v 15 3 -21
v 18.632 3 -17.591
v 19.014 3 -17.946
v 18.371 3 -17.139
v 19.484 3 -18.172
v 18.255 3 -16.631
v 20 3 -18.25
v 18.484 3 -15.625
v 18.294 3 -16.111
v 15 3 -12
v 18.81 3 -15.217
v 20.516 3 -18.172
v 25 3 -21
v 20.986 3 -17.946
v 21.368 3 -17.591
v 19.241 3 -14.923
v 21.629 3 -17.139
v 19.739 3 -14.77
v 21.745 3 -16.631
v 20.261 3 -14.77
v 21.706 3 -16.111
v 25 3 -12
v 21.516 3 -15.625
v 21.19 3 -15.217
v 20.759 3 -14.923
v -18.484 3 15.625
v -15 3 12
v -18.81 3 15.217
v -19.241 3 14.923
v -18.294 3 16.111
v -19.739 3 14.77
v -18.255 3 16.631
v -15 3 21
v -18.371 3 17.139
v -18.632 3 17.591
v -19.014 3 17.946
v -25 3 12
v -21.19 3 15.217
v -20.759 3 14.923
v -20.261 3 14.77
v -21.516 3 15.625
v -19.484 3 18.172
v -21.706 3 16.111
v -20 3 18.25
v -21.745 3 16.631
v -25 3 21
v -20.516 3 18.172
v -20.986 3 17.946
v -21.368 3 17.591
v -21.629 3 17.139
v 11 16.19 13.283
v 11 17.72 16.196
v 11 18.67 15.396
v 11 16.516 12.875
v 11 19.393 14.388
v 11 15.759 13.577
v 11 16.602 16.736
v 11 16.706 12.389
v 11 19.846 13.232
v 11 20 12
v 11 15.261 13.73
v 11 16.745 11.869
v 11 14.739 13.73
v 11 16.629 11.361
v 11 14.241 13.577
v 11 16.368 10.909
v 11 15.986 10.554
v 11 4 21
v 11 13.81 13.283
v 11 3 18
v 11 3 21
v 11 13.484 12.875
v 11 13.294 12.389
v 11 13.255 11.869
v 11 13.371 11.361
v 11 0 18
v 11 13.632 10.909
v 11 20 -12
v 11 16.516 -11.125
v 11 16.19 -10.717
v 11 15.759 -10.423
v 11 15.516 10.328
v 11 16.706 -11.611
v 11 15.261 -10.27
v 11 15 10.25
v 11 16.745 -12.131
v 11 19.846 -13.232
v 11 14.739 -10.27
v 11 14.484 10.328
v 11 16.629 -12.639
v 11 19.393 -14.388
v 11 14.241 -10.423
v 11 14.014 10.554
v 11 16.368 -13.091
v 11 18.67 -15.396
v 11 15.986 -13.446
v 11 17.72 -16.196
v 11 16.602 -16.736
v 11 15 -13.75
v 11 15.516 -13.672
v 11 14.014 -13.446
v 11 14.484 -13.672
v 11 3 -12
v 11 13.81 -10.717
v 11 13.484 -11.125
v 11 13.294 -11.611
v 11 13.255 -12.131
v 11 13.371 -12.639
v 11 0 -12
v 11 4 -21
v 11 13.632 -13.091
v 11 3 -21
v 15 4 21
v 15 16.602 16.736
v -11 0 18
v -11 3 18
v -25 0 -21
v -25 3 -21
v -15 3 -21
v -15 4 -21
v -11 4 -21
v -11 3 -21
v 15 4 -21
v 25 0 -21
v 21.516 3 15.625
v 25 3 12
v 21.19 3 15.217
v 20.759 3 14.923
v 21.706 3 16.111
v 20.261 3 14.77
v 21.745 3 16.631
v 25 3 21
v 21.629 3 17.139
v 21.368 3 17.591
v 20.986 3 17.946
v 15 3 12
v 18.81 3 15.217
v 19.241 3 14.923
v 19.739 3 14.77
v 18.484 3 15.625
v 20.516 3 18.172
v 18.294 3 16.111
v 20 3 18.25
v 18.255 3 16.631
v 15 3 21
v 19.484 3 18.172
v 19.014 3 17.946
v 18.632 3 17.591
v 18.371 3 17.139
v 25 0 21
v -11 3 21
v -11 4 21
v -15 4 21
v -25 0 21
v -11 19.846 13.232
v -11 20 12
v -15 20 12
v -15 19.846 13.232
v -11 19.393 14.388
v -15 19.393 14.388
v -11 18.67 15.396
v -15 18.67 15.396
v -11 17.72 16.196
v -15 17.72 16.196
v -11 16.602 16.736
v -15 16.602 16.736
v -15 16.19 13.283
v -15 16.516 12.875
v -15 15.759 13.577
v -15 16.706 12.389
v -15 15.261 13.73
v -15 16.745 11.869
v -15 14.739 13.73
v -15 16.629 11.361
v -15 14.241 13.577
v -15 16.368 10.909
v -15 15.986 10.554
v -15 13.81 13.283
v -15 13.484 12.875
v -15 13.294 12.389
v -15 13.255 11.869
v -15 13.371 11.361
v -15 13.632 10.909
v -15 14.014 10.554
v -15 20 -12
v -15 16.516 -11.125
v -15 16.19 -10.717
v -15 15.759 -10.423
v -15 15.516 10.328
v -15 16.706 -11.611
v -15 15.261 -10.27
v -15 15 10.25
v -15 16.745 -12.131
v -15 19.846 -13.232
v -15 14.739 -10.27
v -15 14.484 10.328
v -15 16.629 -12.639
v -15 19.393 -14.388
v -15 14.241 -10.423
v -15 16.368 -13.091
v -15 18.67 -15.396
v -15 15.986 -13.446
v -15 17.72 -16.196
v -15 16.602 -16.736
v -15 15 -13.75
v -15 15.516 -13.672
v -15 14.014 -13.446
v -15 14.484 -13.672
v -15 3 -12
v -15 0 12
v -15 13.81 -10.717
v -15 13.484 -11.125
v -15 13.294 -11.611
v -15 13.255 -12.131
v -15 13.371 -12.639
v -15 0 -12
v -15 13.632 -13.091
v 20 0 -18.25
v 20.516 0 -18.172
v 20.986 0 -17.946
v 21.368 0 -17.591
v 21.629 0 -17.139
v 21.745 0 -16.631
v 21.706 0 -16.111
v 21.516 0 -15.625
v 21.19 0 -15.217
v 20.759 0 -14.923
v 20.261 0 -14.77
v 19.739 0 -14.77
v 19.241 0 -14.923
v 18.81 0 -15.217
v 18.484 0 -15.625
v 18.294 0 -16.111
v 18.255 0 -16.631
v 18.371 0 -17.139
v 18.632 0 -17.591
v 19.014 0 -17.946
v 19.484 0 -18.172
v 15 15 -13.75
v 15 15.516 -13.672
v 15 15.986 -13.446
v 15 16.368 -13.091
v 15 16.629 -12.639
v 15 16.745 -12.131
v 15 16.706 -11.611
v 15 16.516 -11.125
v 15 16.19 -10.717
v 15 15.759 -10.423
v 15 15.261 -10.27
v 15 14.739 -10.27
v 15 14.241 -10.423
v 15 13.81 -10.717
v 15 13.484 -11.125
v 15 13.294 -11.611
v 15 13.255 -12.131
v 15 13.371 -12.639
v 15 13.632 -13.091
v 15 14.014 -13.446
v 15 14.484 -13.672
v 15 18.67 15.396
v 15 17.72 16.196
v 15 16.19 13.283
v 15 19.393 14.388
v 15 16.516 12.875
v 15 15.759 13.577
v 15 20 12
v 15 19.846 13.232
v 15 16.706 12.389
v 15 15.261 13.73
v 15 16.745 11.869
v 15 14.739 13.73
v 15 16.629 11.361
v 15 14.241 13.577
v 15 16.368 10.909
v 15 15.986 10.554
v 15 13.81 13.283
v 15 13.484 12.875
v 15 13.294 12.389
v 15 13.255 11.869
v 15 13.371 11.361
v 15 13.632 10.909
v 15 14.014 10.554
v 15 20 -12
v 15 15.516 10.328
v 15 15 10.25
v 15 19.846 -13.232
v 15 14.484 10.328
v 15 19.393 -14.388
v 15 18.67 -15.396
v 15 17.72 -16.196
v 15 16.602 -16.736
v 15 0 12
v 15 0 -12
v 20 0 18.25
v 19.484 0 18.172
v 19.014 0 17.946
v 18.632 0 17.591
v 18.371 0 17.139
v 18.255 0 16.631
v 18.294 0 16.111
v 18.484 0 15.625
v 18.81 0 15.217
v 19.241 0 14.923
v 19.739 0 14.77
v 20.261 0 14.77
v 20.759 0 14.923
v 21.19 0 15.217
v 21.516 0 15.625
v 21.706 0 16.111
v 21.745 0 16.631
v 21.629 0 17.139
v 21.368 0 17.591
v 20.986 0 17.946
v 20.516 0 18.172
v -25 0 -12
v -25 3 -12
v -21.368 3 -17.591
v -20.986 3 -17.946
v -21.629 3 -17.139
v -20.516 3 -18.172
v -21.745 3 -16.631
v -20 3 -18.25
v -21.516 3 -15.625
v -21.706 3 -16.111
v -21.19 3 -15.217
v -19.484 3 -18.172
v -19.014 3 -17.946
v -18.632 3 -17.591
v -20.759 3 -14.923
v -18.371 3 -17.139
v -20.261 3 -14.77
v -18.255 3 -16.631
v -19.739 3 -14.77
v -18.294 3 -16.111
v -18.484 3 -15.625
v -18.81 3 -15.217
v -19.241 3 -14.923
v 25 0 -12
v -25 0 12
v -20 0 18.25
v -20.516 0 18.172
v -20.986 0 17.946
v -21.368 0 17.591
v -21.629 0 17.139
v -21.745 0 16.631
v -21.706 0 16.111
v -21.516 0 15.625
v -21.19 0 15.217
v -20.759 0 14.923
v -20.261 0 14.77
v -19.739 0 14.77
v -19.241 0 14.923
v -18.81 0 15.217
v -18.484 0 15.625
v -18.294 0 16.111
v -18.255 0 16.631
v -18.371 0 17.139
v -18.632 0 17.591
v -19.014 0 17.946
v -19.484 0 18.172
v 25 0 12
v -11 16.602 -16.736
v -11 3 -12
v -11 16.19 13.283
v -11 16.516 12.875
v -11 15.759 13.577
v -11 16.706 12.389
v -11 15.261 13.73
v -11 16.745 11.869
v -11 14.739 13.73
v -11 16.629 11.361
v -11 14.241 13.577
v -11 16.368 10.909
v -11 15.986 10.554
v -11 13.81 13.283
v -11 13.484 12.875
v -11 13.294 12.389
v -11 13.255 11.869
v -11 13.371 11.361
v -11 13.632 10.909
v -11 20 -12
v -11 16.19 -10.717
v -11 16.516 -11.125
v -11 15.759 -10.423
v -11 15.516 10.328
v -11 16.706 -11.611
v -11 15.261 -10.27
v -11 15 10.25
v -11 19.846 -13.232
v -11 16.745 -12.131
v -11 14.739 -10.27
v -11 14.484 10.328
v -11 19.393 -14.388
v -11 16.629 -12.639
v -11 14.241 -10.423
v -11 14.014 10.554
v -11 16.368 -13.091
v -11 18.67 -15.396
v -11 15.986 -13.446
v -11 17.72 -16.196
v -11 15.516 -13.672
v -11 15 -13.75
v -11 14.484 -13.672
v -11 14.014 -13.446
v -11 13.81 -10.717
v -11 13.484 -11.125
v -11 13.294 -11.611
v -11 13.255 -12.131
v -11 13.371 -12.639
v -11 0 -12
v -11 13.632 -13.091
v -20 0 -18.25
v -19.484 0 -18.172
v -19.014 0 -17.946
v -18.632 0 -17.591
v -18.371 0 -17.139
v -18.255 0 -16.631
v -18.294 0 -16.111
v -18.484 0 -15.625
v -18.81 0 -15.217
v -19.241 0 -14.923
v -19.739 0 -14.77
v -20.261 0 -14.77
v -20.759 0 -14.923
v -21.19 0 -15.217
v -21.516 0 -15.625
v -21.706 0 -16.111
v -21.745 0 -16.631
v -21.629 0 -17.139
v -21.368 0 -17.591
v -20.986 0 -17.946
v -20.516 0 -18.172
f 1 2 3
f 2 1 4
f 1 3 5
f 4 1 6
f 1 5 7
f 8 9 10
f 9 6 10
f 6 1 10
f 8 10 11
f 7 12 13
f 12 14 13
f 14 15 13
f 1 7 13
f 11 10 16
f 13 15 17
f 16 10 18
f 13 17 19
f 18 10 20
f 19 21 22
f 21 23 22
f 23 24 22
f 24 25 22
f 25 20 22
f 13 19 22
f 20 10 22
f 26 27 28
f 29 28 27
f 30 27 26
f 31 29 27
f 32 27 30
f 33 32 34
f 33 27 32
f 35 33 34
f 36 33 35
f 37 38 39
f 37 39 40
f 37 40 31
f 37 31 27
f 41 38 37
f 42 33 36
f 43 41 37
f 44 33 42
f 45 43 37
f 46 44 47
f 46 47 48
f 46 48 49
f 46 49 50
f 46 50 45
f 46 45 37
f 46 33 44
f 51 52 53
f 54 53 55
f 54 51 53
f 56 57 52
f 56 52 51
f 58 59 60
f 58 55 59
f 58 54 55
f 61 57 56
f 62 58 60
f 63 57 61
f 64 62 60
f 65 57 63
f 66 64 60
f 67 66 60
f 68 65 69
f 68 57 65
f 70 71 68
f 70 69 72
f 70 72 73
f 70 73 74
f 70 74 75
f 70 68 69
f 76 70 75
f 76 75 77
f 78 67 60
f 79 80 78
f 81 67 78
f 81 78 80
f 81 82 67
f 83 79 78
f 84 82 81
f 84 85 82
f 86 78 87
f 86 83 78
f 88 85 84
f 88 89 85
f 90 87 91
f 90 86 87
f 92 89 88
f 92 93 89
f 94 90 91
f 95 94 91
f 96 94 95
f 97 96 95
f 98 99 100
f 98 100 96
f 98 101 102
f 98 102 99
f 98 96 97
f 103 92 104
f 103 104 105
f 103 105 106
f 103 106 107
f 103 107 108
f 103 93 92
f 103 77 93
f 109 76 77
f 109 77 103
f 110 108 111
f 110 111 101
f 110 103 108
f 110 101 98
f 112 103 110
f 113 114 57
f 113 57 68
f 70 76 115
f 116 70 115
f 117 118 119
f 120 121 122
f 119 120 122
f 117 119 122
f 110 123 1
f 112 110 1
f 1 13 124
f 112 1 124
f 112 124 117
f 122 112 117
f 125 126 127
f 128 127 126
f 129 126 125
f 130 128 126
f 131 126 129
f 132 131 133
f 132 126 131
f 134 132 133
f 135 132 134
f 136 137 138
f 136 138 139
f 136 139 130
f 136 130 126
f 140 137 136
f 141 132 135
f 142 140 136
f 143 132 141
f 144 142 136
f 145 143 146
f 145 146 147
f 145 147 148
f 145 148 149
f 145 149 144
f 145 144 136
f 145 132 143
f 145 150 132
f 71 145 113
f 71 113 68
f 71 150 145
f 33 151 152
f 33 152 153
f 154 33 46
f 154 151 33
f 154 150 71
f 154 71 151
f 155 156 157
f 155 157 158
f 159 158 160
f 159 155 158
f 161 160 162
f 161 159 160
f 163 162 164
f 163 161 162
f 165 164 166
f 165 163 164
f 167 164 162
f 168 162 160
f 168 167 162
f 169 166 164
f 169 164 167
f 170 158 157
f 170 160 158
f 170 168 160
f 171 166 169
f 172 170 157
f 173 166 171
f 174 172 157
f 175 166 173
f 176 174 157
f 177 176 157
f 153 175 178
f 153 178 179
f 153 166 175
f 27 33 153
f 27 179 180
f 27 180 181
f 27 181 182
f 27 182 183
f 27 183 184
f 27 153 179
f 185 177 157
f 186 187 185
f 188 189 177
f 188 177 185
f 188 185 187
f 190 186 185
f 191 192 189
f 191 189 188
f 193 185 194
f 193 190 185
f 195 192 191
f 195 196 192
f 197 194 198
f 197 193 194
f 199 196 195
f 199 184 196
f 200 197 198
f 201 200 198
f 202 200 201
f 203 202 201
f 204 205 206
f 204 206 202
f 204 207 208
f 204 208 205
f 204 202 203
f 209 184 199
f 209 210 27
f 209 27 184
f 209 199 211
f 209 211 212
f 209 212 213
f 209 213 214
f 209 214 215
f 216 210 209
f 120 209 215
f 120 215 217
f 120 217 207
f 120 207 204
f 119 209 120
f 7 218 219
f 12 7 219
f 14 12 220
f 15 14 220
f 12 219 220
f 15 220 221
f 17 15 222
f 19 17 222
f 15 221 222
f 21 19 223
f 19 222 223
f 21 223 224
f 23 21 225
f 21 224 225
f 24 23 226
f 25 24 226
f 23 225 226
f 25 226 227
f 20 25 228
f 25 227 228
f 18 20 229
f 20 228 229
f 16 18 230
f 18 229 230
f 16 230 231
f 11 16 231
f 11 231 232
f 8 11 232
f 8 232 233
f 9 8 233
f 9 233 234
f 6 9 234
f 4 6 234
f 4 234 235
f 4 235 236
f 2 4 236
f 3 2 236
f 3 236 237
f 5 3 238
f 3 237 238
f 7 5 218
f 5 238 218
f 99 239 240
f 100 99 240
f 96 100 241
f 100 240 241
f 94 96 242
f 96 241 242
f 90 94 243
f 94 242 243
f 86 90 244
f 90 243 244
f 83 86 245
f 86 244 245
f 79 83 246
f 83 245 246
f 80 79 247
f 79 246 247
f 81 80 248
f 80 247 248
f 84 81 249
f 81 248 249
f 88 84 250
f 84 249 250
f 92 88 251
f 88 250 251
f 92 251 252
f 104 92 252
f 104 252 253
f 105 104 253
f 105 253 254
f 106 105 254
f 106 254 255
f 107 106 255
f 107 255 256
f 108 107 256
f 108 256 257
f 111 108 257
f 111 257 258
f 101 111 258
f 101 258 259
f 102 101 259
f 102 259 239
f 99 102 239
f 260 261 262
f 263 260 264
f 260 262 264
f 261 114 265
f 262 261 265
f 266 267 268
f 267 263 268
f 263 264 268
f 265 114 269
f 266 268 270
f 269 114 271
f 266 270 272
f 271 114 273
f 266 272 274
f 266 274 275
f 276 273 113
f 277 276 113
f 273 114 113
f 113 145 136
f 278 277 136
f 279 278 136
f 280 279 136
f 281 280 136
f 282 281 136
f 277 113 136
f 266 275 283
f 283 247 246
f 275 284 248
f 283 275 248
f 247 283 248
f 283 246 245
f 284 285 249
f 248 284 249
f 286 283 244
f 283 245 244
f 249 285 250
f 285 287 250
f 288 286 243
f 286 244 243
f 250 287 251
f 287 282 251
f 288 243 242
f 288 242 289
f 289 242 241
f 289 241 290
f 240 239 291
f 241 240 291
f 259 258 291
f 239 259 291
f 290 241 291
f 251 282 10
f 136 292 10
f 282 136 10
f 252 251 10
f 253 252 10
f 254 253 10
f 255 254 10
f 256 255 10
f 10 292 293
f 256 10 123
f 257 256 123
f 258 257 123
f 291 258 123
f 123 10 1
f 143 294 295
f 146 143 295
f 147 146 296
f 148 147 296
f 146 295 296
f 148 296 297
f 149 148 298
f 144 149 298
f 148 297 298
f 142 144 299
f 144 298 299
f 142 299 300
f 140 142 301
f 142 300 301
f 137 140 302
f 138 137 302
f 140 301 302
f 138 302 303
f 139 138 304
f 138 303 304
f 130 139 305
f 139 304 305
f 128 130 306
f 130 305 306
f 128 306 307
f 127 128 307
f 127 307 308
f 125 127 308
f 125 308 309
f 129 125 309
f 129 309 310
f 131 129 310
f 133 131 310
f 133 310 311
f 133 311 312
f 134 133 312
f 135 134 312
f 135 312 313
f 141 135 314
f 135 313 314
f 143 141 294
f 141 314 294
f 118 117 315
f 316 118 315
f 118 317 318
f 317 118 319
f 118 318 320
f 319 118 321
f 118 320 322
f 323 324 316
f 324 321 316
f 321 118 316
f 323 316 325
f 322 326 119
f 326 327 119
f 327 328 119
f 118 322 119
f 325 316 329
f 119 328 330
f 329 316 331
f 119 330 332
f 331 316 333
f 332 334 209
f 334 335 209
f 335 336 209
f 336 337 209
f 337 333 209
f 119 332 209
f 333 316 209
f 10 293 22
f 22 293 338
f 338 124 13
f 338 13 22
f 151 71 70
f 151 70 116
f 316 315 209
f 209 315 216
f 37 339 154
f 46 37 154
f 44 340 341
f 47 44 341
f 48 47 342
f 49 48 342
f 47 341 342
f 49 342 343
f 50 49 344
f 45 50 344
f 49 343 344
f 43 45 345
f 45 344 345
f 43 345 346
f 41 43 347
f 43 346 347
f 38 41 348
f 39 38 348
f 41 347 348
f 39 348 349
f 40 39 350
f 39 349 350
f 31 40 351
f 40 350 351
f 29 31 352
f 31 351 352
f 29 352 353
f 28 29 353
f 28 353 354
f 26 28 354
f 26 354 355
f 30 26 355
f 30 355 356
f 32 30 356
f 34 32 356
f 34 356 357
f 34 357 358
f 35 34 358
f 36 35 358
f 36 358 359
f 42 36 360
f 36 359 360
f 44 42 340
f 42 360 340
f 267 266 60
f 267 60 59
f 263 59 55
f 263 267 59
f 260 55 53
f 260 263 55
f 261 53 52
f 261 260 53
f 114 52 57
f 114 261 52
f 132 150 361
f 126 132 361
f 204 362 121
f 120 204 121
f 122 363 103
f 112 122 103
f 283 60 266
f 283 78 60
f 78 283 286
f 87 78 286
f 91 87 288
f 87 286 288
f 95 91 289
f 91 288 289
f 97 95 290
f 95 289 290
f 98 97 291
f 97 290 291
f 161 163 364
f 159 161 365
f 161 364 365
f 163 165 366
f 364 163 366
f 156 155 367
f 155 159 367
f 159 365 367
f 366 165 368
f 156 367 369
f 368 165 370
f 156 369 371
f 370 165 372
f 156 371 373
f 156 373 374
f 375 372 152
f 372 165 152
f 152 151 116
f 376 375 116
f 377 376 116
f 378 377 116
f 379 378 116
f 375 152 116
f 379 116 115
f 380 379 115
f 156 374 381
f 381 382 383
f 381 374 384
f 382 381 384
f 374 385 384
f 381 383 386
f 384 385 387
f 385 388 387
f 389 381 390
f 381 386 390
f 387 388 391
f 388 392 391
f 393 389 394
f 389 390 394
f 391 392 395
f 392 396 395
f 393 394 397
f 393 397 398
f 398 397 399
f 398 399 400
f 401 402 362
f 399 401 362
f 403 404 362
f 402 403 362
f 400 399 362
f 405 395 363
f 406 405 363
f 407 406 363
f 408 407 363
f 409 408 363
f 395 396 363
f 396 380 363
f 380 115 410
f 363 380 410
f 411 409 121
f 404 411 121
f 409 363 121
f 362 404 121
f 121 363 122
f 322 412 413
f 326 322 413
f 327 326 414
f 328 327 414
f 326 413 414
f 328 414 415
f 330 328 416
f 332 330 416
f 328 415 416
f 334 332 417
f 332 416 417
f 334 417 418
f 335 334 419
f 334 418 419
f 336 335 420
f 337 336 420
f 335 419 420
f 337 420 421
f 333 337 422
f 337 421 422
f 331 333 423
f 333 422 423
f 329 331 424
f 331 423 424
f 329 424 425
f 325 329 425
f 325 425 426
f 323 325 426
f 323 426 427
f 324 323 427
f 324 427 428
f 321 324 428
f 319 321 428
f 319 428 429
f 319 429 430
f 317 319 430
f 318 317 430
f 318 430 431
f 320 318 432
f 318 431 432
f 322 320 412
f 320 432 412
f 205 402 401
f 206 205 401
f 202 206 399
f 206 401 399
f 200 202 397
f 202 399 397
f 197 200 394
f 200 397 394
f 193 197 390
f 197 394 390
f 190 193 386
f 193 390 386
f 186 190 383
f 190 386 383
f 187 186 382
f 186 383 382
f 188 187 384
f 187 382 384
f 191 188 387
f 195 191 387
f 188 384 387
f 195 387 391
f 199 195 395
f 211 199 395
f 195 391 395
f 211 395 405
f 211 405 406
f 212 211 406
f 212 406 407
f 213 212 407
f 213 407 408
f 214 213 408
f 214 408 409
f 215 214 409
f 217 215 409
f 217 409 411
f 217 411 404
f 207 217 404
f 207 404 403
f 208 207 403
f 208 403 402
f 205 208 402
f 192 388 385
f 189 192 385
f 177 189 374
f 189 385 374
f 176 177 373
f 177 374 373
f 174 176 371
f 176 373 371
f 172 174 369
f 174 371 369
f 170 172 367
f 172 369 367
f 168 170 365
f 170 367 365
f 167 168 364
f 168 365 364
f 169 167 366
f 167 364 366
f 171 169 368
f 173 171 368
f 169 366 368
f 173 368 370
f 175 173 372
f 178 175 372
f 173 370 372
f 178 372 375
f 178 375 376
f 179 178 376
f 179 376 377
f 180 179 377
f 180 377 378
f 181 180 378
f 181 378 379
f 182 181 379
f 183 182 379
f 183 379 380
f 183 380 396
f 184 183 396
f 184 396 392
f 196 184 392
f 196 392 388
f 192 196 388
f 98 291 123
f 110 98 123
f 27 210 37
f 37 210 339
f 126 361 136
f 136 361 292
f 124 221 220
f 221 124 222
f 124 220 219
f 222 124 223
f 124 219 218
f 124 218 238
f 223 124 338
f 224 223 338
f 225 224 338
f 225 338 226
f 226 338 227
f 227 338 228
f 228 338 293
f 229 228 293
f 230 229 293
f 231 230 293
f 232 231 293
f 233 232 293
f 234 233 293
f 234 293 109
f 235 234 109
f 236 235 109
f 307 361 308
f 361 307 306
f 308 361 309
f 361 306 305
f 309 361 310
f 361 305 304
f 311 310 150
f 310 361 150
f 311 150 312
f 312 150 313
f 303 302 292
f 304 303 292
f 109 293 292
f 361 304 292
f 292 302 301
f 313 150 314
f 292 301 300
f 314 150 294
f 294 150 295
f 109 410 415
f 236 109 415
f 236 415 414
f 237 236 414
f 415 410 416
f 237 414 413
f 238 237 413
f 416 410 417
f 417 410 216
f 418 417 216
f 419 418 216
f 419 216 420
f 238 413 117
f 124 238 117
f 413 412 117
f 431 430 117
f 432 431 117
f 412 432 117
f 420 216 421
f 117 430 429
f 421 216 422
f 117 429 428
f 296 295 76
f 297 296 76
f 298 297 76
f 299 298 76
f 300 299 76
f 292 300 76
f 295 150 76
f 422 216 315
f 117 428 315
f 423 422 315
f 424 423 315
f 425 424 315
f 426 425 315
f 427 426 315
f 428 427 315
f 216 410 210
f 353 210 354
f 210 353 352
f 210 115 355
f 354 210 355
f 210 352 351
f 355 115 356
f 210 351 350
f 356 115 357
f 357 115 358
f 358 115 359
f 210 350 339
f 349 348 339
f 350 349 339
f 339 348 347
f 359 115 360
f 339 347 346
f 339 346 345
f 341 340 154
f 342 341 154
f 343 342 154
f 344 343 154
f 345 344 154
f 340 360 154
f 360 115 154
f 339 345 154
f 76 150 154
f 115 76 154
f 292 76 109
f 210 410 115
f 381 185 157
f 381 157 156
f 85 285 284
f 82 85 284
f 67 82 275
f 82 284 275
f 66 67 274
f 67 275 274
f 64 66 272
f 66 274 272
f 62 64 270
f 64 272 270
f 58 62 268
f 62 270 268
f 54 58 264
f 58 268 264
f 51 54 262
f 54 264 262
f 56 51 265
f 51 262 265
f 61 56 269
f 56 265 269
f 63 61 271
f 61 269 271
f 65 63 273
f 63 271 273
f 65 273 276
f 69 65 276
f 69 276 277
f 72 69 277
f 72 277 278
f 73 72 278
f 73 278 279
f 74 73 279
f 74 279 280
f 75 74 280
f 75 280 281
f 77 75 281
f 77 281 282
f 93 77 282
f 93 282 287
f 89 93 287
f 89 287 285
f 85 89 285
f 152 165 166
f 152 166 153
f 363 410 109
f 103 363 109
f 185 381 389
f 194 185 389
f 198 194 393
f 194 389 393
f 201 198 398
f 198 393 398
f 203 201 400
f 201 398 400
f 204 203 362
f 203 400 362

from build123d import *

# Parameters (mm, degrees)
ESBO_O1_W                  = 30
ESBO_O1_H                  = 50
ESBO_O1_W_2                = 22
ESBO_O1_H_2                = 42
RESSALTO_EXTRUS_O1_DEPTH   = 20
ESBO_O3_R                  = 1.75
CORTE_EXTRUS_O2_DEPTH      = 44.874821937
CORTE_EXTRUS_O3_DEPTH      = 44.874821937
CORTE_EXTRUS_O3_DEPTH_BACK = 44.874821937
ESBO_O6_R                  = 1.75
ESBO_O6_W                  = 50
ESBO_O6_H                  = 9
RESSALTO_EXTRUS_O2_DEPTH   = 3


with BuildPart() as part:
    # Esboço1 → Ressalto-extrusão1 (new body)
    with BuildSketch(Plane(origin=(0, 0, 0), x_dir=(1, 0, 0), z_dir=(0, 1, 0))):
        Rectangle(ESBO_O1_W, ESBO_O1_H)
        Rectangle(ESBO_O1_W_2, ESBO_O1_H_2, mode=Mode.SUBTRACT)
    extrude(amount=RESSALTO_EXTRUS_O1_DEPTH)

    # Esboço3 → Corte-extrusão2 (cut, through all)
    with BuildSketch(Plane(origin=(15, 0, 0), x_dir=(0, 0, -1), z_dir=(1, 0, 0))):
        with Locations((-12, 15)):
            Circle(ESBO_O3_R)
        with Locations((12, 15)):
            Circle(ESBO_O3_R)
    extrude(amount=-CORTE_EXTRUS_O2_DEPTH, mode=Mode.SUBTRACT)

    # Esboço5 → Corte-extrusão3 (cut, two sides: drawn at the far end of the back side and taken through both)
    with BuildSketch(Plane.ZY.offset(15).offset(-CORTE_EXTRUS_O3_DEPTH_BACK)):
        with BuildLine():
            Line((-16.736274298, 16.602406244), (-21, 4))
            Line((-21, 4), (-21, 0))
            Line((-21, 0), (-25, 0))
            Line((-25, 0), (-25, 4))
            Line((-25, 4), (-25, 20))
            Line((-25, 20), (-12, 20))
            ThreePointArc((-12, 20), (-14.914444096, 19.062759605), (-16.736274298, 16.602406244))
        make_face()
        with BuildLine():
            Line((25, 0), (25, 4))
            Line((25, 4), (25, 20))
            Line((25, 20), (12, 20))
            ThreePointArc((12, 20), (14.914444096, 19.062759605), (16.736274298, 16.602406244))
            Line((16.736274298, 16.602406244), (21, 4))
            Line((21, 4), (21, 0))
            Line((21, 0), (25, 0))
        make_face()
    extrude(amount=CORTE_EXTRUS_O3_DEPTH + CORTE_EXTRUS_O3_DEPTH_BACK, mode=Mode.SUBTRACT)


with BuildPart() as corte_extrus_o3_piece_1:
    # of the separate pieces the step leaves, piece 1, a body of its own (corte_extrus_o3_pieces)
    add(part.part.solids().sort_by_distance((-15, 0, 21))[0])



with BuildPart() as corte_extrus_o3_piece_2:
    # of the separate pieces the step leaves, piece 2, a body of its own (corte_extrus_o3_pieces)
    add(part.part.solids().sort_by_distance((15, 0, -21))[0])


with BuildPart() as corte_extrus_o3_piece_1_1:
    add(corte_extrus_o3_piece_1.part)

    add(corte_extrus_o3_piece_2.part)  # Ressalto-extrusão2 merges Corte-extrusão3 piece 2
    # Esboço6 → Ressalto-extrusão2 (add)
    # profile 1 of 2: a face of its own
    with BuildSketch(Plane.XZ):
        Polygon((-15, 21), (15, 21), (25, 21), (25, 12), (15, 12), (15, 18), (-15, 18), (-15, 12), (-25, 12), (-25, 21), align=None)
        with Locations(Location((20, 16.5, 0), (0, 0, 90))):
            Circle(ESBO_O6_R, mode=Mode.SUBTRACT)
        with Locations(Location((-20, 16.5, 0), (0, 0, 90))):
            Circle(ESBO_O6_R, mode=Mode.SUBTRACT)
    # profile 2 of 2: a face of its own
    with BuildSketch(Plane.XZ):
        with Locations((0, -16.5)):
            Rectangle(ESBO_O6_W, ESBO_O6_H)
        with Locations(Location((-20, -16.5, 0), (0, 0, 270))):
            Circle(ESBO_O6_R, mode=Mode.SUBTRACT)
        with Locations(Location((20, -16.5, 0), (0, 0, 270))):
            Circle(ESBO_O6_R, mode=Mode.SUBTRACT)
    extrude(amount=-RESSALTO_EXTRUS_O2_DEPTH)


solid = corte_extrus_o3_piece_1_1.part
